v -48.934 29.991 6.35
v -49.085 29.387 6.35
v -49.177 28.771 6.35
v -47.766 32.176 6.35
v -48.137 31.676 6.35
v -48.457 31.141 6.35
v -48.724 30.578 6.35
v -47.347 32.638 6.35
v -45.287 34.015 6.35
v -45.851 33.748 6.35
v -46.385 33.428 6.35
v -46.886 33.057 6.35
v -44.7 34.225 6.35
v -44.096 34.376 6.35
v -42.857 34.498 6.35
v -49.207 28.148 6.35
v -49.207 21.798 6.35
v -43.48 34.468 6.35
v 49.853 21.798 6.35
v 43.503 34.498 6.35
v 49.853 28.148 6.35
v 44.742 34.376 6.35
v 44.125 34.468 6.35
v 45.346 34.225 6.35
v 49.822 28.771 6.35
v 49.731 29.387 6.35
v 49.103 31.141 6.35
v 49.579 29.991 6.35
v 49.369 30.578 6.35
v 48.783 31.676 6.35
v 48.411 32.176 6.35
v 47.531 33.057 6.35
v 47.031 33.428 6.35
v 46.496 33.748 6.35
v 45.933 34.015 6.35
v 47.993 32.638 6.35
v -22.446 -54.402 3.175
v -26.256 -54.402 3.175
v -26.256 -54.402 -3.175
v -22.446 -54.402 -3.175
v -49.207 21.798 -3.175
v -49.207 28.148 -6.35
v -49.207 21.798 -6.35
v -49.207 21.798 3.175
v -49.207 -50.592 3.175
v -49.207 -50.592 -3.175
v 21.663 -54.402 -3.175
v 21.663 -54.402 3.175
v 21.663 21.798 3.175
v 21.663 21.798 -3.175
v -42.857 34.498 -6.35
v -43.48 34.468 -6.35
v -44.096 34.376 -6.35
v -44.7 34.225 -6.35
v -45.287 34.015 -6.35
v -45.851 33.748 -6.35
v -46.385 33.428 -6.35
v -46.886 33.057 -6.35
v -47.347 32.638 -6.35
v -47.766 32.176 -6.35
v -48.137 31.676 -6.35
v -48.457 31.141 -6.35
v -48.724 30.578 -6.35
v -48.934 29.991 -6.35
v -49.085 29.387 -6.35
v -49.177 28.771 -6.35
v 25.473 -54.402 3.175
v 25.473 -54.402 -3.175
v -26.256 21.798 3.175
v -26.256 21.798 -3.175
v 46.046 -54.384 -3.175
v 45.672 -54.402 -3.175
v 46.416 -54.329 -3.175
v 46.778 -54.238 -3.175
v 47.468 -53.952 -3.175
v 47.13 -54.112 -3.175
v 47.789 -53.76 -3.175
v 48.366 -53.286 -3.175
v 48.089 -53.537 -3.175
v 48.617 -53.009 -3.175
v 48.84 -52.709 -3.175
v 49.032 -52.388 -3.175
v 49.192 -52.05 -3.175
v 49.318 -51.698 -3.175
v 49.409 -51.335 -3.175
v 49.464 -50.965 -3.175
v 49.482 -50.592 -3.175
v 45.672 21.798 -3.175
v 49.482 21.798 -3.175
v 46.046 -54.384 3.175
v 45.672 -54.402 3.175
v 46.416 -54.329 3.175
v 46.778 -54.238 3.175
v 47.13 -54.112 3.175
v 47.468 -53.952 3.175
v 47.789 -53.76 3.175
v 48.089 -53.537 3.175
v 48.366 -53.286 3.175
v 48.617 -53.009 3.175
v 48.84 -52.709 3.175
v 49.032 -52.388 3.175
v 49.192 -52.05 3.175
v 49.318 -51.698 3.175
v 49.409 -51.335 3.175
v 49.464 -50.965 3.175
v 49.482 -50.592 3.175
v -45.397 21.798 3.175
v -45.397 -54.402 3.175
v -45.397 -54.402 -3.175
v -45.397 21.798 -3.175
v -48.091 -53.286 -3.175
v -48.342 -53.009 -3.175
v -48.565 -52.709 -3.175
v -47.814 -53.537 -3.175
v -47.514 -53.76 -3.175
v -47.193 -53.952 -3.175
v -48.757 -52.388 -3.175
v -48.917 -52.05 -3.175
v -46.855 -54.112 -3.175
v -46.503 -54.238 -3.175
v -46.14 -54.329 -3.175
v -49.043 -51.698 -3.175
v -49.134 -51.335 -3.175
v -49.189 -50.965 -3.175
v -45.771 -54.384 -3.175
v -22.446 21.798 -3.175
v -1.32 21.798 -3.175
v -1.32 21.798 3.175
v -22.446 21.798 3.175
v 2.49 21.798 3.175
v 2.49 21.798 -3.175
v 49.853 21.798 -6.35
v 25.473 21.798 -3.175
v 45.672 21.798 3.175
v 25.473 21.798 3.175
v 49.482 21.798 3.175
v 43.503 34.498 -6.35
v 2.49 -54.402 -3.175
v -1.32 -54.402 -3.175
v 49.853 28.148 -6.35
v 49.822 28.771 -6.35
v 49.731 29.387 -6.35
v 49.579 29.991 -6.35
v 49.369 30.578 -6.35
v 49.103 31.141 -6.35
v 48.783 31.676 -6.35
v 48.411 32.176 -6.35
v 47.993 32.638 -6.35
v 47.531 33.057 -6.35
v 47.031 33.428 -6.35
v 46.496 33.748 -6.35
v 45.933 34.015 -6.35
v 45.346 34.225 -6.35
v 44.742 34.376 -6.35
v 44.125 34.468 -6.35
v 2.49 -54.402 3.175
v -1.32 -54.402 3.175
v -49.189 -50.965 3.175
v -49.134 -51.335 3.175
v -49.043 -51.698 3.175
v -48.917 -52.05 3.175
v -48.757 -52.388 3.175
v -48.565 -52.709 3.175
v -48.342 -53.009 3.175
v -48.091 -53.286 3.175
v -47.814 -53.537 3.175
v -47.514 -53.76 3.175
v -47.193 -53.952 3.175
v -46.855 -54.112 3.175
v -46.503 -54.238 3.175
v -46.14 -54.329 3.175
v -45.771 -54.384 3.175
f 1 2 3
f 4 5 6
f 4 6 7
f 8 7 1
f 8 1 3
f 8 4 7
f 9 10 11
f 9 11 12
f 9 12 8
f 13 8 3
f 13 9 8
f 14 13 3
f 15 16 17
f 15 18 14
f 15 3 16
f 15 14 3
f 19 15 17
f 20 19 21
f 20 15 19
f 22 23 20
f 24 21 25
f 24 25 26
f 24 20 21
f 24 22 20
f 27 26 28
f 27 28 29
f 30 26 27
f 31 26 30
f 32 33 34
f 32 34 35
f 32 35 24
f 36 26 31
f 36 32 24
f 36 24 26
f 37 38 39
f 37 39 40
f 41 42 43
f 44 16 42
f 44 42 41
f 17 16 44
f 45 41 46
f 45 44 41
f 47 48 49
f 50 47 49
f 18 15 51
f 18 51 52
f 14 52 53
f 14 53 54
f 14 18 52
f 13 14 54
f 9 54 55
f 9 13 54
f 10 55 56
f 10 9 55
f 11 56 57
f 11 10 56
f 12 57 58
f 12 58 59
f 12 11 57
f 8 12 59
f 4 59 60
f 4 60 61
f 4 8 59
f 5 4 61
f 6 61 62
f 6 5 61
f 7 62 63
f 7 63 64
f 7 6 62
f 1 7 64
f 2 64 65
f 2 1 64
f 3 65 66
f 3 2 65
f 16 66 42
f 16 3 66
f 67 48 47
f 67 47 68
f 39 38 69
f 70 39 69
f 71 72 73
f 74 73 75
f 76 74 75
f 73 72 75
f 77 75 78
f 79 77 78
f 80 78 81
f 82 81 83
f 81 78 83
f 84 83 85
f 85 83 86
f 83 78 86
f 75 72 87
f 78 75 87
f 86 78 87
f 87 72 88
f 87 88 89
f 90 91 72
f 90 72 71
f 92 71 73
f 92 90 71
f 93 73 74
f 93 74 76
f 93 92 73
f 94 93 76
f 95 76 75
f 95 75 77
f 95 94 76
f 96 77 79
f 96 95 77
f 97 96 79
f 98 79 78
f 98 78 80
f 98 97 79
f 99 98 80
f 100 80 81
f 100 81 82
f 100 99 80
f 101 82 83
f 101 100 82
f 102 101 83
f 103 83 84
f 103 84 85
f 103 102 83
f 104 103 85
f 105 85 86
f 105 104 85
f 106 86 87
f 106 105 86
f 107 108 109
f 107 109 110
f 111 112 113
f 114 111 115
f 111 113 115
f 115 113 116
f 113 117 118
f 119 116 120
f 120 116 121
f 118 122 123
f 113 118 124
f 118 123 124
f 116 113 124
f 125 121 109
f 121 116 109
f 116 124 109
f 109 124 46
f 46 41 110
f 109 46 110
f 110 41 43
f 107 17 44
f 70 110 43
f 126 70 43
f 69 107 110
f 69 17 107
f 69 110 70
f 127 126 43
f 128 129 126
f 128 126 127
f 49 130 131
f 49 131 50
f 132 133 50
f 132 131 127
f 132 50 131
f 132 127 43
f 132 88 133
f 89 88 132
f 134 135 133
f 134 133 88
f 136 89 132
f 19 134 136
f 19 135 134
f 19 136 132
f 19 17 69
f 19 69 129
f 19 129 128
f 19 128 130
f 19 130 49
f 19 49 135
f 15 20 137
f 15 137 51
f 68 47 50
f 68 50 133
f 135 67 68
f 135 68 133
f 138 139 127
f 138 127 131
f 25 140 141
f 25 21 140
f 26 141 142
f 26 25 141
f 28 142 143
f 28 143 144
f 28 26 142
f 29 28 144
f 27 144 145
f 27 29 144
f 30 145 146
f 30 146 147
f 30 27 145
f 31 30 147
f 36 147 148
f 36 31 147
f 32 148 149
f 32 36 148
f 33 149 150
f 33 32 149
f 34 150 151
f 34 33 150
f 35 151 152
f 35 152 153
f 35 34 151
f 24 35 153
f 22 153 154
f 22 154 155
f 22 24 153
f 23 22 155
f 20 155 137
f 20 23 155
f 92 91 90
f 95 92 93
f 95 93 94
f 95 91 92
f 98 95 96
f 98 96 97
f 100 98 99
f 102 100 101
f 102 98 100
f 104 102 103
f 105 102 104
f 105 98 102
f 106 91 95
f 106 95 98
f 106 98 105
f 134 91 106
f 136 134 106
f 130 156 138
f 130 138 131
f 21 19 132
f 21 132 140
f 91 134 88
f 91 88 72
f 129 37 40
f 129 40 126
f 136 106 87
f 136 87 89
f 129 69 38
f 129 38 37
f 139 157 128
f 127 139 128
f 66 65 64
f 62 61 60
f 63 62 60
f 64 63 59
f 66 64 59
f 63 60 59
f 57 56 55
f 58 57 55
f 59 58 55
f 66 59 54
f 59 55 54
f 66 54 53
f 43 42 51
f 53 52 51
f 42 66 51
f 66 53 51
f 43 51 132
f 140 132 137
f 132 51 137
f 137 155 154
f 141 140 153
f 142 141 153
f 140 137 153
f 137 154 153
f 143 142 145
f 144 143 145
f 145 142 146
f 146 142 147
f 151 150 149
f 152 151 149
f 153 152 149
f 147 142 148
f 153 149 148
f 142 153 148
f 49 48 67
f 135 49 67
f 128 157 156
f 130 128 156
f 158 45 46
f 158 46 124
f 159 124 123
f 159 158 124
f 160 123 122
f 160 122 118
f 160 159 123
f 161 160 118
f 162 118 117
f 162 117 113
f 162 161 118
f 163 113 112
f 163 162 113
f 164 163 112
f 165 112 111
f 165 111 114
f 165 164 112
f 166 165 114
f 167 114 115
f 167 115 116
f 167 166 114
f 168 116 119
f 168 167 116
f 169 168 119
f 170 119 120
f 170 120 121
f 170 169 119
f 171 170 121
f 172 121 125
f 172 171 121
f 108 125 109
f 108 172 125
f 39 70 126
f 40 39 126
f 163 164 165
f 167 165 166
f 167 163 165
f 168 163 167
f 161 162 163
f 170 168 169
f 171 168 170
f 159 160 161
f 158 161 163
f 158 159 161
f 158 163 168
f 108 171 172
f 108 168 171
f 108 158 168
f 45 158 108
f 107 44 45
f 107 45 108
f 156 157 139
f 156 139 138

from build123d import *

# Parameters (mm, degrees)
F1_DEPTH = 6.35
F0_W     = 3.81
F0_H     = 76.2000009209
F0_H_2   = 76.2
F2_DEPTH = 3.175


# Not quite as in the source:
# - ends of sketch curves that miss each other by under 0.0002 mm in the source are joined


with BuildPart() as f1:
    # F0 (on Top) → F1 (new body, symmetric)
    with BuildSketch(Plane.XY):
        with BuildLine():
            Line((-49.2071506187, 28.1480993807), (-49.2071506187, 21.7980993807))
            Line((-49.2071506187, 21.7980993807), (-45.3971506187, 21.7980993807))
            Line((-45.3971506187, 21.7980993807), (-26.2557423981, 21.7980993807))
            Line((-26.2557423981, 21.7980993807), (-22.4457423981, 21.7980993807))
            Line((-22.4457423981, 21.7980993807), (-1.3203332201, 21.7980993807))
            Line((-1.3203332201, 21.7980993807), (2.4896667799, 21.7980993807))
            Line((2.4896667799, 21.7980993807), (21.6630548239, 21.7980993807))
            Line((21.6630548239, 21.7980993807), (25.4730548239, 21.7980993807))
            Line((25.4730548239, 21.7980993807), (45.6722128358, 21.7980993807))
            Line((45.6722128358, 21.7980993807), (49.4822128358, 21.7980993807))
            Line((49.4822128358, 21.7980993807), (49.8528493813, 21.7980993807))
            Line((49.8528493813, 21.7980993807), (49.8528493813, 28.1480993807))
            ThreePointArc((49.8528493813, 28.1480993807), (47.9929774418, 32.6382274413), (43.5028493813, 34.4980993807))
            Line((43.5028493813, 34.4980993807), (-42.8571506187, 34.4980993807))
            ThreePointArc((-42.8571506187, 34.4980993807), (-47.3472786793, 32.6382274413), (-49.2071506187, 28.1480993807))
        make_face()
    extrude(amount=F1_DEPTH, both=True)

    # F0 (on Top) → F2 (join, symmetric)
    with BuildSketch(Plane.XY):
        with BuildLine():
            Line((-49.2071506187, 28.1480993807), (-49.2071506187, 21.7980993807))
            Line((-49.2071506187, 21.7980993807), (-45.3971506187, 21.7980993807))
            Line((-45.3971506187, 21.7980993807), (-26.2557423981, 21.7980993807))
            Line((-26.2557423981, 21.7980993807), (-22.4457423981, 21.7980993807))
            Line((-22.4457423981, 21.7980993807), (-1.3203332201, 21.7980993807))
            Line((-1.3203332201, 21.7980993807), (2.4896667799, 21.7980993807))
            Line((2.4896667799, 21.7980993807), (21.6630548239, 21.7980993807))
            Line((21.6630548239, 21.7980993807), (25.4730548239, 21.7980993807))
            Line((25.4730548239, 21.7980993807), (45.6722128358, 21.7980993807))
            Line((45.6722128358, 21.7980993807), (49.4822128358, 21.7980993807))
            Line((49.4822128358, 21.7980993807), (49.8528493813, 21.7980993807))
            Line((49.8528493813, 21.7980993807), (49.8528493813, 28.1480993807))
            ThreePointArc((49.8528493813, 28.1480993807), (47.9929774418, 32.6382274413), (43.5028493813, 34.4980993807))
            Line((43.5028493813, 34.4980993807), (-42.8571506187, 34.4980993807))
            ThreePointArc((-42.8571506187, 34.4980993807), (-47.3472786793, 32.6382274413), (-49.2071506187, 28.1480993807))
        make_face()
        with BuildLine():
            Line((-45.3971506187, 21.7980993807), (-49.2071506187, 21.7980993807))
            Line((-49.2071506187, 21.7980993807), (-49.2071506187, -50.5919006193))
            ThreePointArc((-49.2071506187, -50.5919006193), (-48.0912274551, -53.2859774556), (-45.3971506187, -54.4019006193))
            Line((-45.3971506187, -54.4019006193), (-45.3971506187, 21.7980993807))
        make_face()
        with Locations((-24.3507423981, -16.3019010797)):
            Rectangle(F0_W, F0_H)
        with Locations((0.5846667799, -16.3019006193)):
            Rectangle(F0_W, F0_H_2)
        with Locations((23.5680548239, -16.3019006193)):
            Rectangle(F0_W, F0_H_2)
        with BuildLine():
            Line((49.4822128358, -50.5919006193), (49.4822128358, 21.7980993807))
            Line((49.4822128358, 21.7980993807), (45.6722128358, 21.7980993807))
            Line((45.6722128358, 21.7980993807), (45.6722128358, -54.4019006193))
            ThreePointArc((45.6722128358, -54.4019006193), (48.3662896722, -53.2859774556), (49.4822128358, -50.5919006193))
        make_face()
    extrude(amount=F2_DEPTH, both=True)


solid = f1.part
